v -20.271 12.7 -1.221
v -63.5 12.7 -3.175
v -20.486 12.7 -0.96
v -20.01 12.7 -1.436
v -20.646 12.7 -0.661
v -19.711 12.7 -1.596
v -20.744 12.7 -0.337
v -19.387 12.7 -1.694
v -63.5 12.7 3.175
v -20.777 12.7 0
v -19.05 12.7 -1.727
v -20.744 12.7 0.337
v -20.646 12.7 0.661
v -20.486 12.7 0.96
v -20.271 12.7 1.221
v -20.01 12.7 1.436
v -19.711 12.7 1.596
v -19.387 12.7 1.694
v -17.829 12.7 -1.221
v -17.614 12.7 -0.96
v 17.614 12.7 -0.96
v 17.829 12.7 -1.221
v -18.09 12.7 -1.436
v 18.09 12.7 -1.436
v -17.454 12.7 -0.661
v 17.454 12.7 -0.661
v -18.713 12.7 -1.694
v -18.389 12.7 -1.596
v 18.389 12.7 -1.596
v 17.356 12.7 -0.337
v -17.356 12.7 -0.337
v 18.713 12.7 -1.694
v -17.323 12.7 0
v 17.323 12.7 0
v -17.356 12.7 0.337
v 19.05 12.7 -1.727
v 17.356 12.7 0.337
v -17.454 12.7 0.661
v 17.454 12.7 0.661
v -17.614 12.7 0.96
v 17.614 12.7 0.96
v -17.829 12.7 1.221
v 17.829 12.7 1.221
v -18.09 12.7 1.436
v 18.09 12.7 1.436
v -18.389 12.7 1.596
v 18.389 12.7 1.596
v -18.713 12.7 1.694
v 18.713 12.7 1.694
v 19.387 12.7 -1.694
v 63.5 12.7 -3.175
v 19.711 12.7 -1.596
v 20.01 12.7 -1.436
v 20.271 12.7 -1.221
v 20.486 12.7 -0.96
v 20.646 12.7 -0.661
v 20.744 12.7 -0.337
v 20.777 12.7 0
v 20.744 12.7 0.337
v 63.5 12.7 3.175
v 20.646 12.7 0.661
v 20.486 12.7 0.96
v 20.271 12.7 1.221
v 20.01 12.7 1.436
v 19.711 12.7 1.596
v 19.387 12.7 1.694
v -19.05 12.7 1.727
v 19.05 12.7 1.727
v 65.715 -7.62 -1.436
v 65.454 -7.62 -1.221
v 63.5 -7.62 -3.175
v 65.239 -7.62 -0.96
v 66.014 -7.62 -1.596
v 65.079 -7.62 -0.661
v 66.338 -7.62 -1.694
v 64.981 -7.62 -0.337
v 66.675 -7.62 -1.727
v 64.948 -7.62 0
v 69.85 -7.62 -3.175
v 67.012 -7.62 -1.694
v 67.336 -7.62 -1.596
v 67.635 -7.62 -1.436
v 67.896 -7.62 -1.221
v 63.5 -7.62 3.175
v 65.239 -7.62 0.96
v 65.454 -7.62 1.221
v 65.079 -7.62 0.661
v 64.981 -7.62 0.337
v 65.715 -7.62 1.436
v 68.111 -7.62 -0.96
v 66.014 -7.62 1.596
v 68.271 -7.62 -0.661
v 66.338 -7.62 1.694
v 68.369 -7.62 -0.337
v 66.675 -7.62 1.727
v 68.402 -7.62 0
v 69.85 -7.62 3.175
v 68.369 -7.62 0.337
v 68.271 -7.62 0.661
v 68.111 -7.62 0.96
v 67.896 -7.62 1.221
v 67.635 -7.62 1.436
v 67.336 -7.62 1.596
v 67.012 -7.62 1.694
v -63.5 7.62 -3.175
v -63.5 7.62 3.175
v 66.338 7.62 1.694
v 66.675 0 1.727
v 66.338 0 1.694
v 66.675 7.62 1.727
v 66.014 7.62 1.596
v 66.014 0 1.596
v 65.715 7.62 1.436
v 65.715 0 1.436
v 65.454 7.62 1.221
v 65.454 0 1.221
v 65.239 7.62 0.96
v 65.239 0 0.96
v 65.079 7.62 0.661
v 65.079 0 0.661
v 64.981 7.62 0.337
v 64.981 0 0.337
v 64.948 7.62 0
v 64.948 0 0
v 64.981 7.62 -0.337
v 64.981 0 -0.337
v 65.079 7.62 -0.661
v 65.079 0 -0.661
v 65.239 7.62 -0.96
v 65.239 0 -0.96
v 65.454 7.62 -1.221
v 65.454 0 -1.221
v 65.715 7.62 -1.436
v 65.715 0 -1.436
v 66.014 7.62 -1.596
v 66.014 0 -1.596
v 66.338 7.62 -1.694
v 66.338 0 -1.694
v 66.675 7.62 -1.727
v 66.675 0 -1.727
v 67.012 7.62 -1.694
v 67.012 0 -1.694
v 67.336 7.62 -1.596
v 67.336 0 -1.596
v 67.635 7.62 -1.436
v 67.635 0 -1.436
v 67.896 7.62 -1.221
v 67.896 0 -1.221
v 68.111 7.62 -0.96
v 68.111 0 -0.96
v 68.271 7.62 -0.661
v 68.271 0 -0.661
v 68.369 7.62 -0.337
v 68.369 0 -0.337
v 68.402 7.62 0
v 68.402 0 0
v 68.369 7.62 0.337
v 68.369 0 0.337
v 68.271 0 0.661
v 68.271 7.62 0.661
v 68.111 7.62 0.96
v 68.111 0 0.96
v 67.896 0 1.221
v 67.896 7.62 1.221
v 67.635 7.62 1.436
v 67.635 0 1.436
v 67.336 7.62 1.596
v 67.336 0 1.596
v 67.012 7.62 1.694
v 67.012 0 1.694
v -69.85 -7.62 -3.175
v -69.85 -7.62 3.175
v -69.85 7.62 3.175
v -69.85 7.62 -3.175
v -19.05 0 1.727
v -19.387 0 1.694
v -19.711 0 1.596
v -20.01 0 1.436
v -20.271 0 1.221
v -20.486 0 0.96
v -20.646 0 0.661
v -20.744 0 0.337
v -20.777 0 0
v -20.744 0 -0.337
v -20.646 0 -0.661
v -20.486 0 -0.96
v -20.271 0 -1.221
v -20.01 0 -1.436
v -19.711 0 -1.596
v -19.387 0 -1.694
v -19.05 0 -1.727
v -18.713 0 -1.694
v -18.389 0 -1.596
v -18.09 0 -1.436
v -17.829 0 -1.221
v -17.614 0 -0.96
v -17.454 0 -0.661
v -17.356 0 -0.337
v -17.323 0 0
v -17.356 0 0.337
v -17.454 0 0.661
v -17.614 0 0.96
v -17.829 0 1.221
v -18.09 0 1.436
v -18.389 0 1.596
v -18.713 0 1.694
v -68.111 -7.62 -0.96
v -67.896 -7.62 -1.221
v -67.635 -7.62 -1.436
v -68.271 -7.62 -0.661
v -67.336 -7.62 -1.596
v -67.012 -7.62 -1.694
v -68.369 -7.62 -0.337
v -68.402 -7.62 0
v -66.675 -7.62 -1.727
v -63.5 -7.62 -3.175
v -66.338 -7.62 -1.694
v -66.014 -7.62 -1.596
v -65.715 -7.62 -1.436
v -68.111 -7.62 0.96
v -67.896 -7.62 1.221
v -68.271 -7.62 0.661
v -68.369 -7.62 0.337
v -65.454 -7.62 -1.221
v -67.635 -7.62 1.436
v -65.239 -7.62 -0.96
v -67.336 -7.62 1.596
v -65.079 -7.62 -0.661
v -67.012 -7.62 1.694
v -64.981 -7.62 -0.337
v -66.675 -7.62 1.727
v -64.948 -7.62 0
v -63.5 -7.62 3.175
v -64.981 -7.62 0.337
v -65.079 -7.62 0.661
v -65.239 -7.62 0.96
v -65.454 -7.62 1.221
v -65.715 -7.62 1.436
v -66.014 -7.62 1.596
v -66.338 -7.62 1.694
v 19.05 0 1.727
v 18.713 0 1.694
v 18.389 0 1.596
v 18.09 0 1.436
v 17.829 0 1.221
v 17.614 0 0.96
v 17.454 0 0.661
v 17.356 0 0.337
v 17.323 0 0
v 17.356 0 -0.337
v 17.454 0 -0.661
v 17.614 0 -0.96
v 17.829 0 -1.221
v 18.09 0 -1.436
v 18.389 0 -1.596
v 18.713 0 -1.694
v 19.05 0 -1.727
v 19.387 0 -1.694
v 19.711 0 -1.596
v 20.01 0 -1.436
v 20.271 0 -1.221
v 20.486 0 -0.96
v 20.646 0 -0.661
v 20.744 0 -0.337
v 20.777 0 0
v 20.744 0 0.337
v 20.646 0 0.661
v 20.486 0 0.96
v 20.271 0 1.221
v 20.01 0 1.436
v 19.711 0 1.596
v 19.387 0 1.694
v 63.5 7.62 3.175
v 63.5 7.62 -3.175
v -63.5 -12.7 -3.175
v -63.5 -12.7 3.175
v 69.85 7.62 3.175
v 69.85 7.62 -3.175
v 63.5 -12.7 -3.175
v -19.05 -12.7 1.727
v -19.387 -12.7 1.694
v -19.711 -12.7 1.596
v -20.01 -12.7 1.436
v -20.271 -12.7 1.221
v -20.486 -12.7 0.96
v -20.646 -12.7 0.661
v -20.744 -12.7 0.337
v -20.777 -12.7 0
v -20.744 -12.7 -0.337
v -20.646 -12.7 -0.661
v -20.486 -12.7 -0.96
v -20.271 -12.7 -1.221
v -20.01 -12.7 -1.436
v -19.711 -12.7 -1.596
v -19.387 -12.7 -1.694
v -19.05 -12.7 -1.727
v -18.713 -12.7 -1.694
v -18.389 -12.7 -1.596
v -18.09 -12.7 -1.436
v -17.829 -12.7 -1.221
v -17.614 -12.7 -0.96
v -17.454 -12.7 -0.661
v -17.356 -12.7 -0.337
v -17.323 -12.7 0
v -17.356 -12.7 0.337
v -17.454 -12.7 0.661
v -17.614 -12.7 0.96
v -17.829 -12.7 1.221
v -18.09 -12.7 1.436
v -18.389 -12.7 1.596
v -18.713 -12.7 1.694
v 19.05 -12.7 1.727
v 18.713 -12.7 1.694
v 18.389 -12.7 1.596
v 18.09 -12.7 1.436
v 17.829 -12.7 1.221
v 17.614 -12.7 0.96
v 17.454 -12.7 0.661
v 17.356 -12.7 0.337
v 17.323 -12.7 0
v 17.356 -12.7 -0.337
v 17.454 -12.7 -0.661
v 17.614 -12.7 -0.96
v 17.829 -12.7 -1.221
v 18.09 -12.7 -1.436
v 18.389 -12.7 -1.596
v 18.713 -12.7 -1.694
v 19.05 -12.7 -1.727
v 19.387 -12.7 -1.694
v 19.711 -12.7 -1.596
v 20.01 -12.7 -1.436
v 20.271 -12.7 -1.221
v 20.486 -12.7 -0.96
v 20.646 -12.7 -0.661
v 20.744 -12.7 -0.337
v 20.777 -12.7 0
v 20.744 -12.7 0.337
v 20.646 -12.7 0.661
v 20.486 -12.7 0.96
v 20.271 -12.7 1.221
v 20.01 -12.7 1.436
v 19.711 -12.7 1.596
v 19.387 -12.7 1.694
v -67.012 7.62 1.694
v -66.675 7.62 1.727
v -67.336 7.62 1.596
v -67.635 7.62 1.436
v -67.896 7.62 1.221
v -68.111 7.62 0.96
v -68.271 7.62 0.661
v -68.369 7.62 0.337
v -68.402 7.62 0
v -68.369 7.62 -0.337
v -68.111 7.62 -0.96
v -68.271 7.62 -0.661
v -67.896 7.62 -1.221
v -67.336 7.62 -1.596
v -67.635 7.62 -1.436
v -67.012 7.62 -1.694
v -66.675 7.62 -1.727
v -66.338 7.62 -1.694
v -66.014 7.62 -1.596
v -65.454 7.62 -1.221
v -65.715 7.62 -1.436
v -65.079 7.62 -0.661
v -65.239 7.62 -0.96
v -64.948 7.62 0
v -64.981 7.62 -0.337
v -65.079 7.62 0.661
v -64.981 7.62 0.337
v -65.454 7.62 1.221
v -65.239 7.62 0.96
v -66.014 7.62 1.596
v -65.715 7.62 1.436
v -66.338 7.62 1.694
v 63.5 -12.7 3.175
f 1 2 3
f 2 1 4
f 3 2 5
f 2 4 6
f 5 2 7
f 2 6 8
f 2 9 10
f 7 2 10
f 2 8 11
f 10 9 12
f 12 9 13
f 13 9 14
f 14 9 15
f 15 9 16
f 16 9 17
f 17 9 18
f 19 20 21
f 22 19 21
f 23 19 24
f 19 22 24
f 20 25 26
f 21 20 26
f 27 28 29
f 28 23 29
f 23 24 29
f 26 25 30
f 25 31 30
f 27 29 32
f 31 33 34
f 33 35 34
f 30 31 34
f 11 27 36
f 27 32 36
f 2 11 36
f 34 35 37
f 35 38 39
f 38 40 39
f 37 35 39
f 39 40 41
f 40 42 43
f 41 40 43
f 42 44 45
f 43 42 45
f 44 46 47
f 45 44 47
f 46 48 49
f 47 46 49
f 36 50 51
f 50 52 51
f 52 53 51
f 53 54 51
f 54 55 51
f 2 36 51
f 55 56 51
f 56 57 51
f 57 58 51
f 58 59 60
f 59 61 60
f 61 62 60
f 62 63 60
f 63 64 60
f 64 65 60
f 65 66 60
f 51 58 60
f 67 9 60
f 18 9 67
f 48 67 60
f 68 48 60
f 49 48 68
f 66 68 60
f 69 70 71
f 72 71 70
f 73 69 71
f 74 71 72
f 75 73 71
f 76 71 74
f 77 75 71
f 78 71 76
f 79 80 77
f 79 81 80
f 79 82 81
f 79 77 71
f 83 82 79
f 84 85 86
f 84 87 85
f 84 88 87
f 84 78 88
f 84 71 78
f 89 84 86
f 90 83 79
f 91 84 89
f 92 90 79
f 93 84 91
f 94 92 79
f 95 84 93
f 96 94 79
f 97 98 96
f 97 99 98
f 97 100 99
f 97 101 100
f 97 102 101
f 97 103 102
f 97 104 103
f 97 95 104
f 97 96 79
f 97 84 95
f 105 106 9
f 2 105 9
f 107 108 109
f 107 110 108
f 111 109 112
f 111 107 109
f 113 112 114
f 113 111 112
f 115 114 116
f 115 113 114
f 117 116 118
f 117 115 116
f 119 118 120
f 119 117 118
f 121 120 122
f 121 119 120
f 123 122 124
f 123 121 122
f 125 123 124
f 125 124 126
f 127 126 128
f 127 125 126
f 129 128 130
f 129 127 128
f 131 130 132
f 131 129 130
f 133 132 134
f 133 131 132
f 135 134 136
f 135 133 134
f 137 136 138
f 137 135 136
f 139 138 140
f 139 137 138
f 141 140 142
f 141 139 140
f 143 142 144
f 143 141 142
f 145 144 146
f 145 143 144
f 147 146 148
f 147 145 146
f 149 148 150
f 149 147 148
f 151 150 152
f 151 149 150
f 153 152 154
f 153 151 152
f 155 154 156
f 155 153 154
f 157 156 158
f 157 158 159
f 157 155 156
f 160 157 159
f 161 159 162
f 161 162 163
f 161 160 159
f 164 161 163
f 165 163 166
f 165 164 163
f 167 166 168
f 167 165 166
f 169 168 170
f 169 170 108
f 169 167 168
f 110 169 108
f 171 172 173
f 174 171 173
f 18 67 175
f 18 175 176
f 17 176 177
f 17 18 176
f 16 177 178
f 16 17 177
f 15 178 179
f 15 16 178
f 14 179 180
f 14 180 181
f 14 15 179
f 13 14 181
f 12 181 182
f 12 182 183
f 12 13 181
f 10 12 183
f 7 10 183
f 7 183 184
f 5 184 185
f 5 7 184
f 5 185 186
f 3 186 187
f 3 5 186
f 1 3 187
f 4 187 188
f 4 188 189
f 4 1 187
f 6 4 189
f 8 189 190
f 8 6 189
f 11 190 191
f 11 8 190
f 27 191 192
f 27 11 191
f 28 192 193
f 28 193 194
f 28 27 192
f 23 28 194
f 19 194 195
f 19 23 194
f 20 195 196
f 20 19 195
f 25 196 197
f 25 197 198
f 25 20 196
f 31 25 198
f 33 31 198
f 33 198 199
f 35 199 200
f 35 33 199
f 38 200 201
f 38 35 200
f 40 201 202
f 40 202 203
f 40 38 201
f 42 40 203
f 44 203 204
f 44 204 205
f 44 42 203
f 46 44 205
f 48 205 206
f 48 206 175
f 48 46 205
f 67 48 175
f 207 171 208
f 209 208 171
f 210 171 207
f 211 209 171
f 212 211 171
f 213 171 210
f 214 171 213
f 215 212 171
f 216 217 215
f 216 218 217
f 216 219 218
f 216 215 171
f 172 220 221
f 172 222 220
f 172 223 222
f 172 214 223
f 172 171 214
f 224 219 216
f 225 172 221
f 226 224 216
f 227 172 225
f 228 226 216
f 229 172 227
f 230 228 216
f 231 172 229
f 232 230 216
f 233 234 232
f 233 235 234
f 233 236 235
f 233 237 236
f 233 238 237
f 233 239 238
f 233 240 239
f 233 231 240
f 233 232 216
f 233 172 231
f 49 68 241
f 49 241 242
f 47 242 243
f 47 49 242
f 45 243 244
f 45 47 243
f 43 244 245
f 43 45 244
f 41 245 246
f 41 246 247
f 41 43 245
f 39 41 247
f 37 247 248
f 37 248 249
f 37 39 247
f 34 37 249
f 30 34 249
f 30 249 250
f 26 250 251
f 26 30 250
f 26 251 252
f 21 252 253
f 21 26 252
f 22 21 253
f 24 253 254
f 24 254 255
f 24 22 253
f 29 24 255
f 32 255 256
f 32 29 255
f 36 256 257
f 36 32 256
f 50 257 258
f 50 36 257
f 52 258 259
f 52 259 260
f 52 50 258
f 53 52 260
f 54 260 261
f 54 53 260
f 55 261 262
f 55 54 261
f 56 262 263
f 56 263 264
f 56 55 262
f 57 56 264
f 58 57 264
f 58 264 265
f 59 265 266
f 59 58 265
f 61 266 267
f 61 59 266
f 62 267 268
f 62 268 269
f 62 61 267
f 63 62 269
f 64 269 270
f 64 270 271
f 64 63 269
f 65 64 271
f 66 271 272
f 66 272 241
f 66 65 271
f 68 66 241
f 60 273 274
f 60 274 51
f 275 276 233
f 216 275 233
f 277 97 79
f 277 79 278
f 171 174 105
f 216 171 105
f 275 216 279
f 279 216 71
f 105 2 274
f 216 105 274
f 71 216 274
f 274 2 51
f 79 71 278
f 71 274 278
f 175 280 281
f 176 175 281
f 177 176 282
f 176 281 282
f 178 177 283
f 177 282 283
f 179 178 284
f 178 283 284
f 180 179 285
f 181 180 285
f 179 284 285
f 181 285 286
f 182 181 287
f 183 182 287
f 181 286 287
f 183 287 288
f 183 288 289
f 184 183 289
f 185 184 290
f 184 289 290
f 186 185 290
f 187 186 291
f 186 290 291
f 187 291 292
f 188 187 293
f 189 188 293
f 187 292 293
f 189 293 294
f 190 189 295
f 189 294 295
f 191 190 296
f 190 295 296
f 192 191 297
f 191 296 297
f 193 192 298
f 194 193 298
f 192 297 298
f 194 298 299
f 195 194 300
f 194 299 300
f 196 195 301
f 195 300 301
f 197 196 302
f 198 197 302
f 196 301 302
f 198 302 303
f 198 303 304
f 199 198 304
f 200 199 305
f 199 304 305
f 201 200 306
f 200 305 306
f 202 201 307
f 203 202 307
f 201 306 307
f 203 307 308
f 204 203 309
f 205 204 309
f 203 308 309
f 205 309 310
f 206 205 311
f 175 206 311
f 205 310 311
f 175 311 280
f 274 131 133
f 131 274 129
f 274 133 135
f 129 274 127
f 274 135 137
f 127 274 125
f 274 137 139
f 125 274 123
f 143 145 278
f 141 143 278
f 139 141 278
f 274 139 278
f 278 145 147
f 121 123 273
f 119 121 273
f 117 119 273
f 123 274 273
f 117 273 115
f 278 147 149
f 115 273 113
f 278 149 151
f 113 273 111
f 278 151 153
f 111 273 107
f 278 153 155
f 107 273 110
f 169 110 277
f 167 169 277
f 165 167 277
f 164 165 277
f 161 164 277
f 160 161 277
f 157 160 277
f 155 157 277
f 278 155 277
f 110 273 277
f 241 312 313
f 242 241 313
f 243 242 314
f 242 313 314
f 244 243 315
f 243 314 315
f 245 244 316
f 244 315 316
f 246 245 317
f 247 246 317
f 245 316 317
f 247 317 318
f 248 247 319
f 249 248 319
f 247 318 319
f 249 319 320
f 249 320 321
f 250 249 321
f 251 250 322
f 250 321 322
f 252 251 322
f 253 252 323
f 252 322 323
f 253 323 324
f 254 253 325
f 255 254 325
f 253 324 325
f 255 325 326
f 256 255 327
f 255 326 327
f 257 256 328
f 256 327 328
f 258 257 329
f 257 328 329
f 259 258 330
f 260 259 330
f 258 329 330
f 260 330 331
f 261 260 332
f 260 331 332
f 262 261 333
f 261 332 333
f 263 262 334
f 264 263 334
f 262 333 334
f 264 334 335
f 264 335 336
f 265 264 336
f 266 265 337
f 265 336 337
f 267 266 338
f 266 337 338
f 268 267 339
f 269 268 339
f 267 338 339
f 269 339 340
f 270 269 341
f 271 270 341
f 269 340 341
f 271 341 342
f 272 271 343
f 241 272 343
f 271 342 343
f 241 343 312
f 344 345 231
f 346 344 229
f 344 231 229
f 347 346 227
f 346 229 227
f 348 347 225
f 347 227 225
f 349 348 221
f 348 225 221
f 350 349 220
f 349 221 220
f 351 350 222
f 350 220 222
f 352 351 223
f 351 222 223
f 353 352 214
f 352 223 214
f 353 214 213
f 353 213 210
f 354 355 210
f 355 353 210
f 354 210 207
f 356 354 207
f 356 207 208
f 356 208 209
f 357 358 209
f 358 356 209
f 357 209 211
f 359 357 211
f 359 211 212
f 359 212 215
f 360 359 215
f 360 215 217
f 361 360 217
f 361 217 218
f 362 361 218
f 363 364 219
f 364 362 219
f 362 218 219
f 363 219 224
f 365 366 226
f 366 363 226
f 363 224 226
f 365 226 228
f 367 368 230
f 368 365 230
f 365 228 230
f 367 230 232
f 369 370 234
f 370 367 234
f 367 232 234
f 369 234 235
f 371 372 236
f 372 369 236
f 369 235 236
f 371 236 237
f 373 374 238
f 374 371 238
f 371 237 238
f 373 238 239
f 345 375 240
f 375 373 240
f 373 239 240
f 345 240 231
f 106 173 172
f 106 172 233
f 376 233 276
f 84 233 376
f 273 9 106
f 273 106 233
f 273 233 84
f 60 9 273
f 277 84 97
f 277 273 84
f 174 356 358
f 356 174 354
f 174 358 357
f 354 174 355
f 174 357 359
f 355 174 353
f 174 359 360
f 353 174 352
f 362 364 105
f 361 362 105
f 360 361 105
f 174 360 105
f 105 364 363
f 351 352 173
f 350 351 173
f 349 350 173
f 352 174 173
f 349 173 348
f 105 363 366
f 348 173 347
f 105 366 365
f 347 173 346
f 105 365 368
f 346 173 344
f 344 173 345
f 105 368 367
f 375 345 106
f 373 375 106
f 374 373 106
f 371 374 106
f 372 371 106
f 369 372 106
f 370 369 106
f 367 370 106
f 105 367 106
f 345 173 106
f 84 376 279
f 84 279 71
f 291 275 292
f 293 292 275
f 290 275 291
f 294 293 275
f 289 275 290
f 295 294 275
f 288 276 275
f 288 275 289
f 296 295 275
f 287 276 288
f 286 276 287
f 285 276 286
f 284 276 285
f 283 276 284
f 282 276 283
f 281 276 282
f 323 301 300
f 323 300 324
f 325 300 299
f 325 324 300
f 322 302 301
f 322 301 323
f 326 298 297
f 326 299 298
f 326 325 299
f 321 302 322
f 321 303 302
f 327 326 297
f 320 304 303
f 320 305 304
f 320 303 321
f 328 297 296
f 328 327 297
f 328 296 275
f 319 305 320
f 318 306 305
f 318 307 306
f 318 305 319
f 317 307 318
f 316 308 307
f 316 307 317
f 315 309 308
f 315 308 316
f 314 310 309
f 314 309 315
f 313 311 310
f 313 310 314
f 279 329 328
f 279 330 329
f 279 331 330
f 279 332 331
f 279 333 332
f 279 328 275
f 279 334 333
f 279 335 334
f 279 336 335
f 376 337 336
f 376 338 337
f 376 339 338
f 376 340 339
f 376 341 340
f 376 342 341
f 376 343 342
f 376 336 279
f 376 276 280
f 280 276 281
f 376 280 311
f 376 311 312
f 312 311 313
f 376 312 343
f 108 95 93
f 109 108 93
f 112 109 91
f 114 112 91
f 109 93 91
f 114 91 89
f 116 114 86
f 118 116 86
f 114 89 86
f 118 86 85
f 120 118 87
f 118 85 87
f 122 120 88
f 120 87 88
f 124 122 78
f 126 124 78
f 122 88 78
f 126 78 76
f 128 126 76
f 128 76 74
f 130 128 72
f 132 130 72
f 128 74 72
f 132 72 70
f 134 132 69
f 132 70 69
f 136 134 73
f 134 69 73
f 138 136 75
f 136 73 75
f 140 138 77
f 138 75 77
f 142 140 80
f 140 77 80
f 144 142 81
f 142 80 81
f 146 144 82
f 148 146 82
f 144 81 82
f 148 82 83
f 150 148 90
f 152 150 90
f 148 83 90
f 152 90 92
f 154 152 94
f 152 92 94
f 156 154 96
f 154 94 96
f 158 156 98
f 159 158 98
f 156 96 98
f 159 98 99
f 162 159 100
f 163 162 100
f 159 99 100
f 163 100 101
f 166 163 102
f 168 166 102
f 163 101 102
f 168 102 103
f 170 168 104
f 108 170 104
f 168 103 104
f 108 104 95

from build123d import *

# Parameters (mm, degrees)
SKETCH1_W                          = 139.7
SKETCH1_H                          = 25.4
BOSS_EXTRUDE1_DEPTH                = 3.175
CUT_EXTRUDE1_REACH                 = 73.279
SKETCH2_W                          = 6.35
SKETCH2_H                          = 5.08
TAP_DRILL_FOR_8_32_TAP1_AT_2_COUNT = 2
TAP_DRILL_FOR_8_32_TAP1_AT_2_PITCH = 47.625
TAP_DRILL_FOR_8_32_TAP1_AT_3_COUNT = 2
TAP_DRILL_FOR_8_32_TAP1_AT_3_PITCH = 85.725
TAP_DRILL_FOR_8_32_TAP1_AT_4_COUNT = 2
TAP_DRILL_FOR_8_32_TAP1_AT_4_PITCH = 133.35


with BuildPart() as part:
    # Sketch1 → Boss-Extrude1 (new, symmetric)
    with BuildSketch(Plane.XY):
        Rectangle(SKETCH1_W, SKETCH1_H)
    extrude(amount=BOSS_EXTRUDE1_DEPTH, both=True)

    # Sketch2 → Cut-Extrude1 (cut, up to next)
    with BuildSketch(Plane.XY.offset(3.175), mode=Mode.PRIVATE) as cut_extrude1_sk1:
        with Locations((-66.675, 10.16)):
            Rectangle(SKETCH2_W, SKETCH2_H)
    cut_extrude1_tool1 = extrude(cut_extrude1_sk1.sketch, amount=-CUT_EXTRUDE1_REACH, mode=Mode.PRIVATE) & part.part
    # Sketch2 → Cut-Extrude1 (cut, up to next)
    with BuildSketch(Plane.XY.offset(3.175), mode=Mode.PRIVATE) as cut_extrude1_sk2:
        with Locations((-66.675, -10.16)):
            Rectangle(SKETCH2_W, SKETCH2_H)
    cut_extrude1_tool2 = extrude(cut_extrude1_sk2.sketch, amount=-CUT_EXTRUDE1_REACH, mode=Mode.PRIVATE) & part.part
    # Sketch2 → Cut-Extrude1 (cut, up to next)
    with BuildSketch(Plane.XY.offset(3.175), mode=Mode.PRIVATE) as cut_extrude1_sk3:
        with Locations((66.675, 10.16)):
            Rectangle(SKETCH2_W, SKETCH2_H)
    cut_extrude1_tool3 = extrude(cut_extrude1_sk3.sketch, amount=-CUT_EXTRUDE1_REACH, mode=Mode.PRIVATE) & part.part
    # Sketch2 → Cut-Extrude1 (cut, up to next)
    with BuildSketch(Plane.XY.offset(3.175), mode=Mode.PRIVATE) as cut_extrude1_sk4:
        with Locations((66.675, -10.16)):
            Rectangle(SKETCH2_W, SKETCH2_H)
    cut_extrude1_tool4 = extrude(cut_extrude1_sk4.sketch, amount=-CUT_EXTRUDE1_REACH, mode=Mode.PRIVATE) & part.part
    add(cut_extrude1_tool1.solids().sort_by_distance((-66.675, 10.16, 3.175))[0], mode=Mode.SUBTRACT)
    add(cut_extrude1_tool2.solids().sort_by_distance((-66.675, -10.16, 3.175))[0], mode=Mode.SUBTRACT)
    add(cut_extrude1_tool3.solids().sort_by_distance((66.675, 10.16, 3.175))[0], mode=Mode.SUBTRACT)
    add(cut_extrude1_tool4.solids().sort_by_distance((66.675, -10.16, 3.175))[0], mode=Mode.SUBTRACT)

    # Sketch5 → Tap Drill for #8-32 Tap1 (revolve, cut)
    with BuildSketch(Plane(origin=(-66.675, 12.7, 0), x_dir=(0, 0, 1), z_dir=(1, 0, 0))):
        Polygon((0, 0), (0, 13.737806461), (1.7272, 12.7), (1.7272, 0), align=None)
    tap_drill_for_8_32_tap1 = revolve(axis=Axis((-66.675, 19.05, 0), (0, -1, 0)), mode=Mode.SUBTRACT)

    # Tap Drill for #8-32 Tap1 at 2: Tap Drill for #8-32 Tap1 ×2
    with Locations(*[(i * TAP_DRILL_FOR_8_32_TAP1_AT_2_PITCH, 0, 0) for i in range(1, TAP_DRILL_FOR_8_32_TAP1_AT_2_COUNT)]):
        add(tap_drill_for_8_32_tap1, mode=Mode.SUBTRACT)

    # Tap Drill for #8-32 Tap1 at 3: Tap Drill for #8-32 Tap1 ×2
    with Locations(*[(i * TAP_DRILL_FOR_8_32_TAP1_AT_3_PITCH, 0, 0) for i in range(1, TAP_DRILL_FOR_8_32_TAP1_AT_3_COUNT)]):
        add(tap_drill_for_8_32_tap1, mode=Mode.SUBTRACT)

    # Tap Drill for #8-32 Tap1 at 4: Tap Drill for #8-32 Tap1 ×2
    with Locations(*[(i * TAP_DRILL_FOR_8_32_TAP1_AT_4_PITCH, 0, 0) for i in range(1, TAP_DRILL_FOR_8_32_TAP1_AT_4_COUNT)]):
        add(tap_drill_for_8_32_tap1, mode=Mode.SUBTRACT)

    # Mirror1: Tap Drill for #8-32 Tap1 across plane
    add(tap_drill_for_8_32_tap1.mirror(Plane.ZX), mode=Mode.SUBTRACT)

    # Mirror1 copy 1 sketch → Mirror1 copy 1 (revolve, cut)
    with BuildSketch(Plane(origin=(-19.05, -12.7, 0), x_dir=(0, 0, 1), z_dir=(1, 0, 0))):
        Polygon((0, 0), (0, -13.737806461), (1.7272, -12.7), (1.7272, 0), align=None)
    revolve(axis=Axis((-19.05, -19.05, 0), (0, -1, 0)), mode=Mode.SUBTRACT)

    # Mirror1 copy 2 sketch → Mirror1 copy 2 (revolve, cut)
    with BuildSketch(Plane(origin=(19.05, -12.7, 0), x_dir=(0, 0, 1), z_dir=(1, 0, 0))):
        Polygon((0, 0), (0, -13.737806461), (1.7272, -12.7), (1.7272, 0), align=None)
    revolve(axis=Axis((19.05, -19.05, 0), (0, -1, 0)), mode=Mode.SUBTRACT)

    # Mirror1 copy 3 sketch → Mirror1 copy 3 (revolve, cut)
    with BuildSketch(Plane(origin=(66.675, -12.7, 0), x_dir=(0, 0, 1), z_dir=(1, 0, 0))):
        Polygon((0, 0), (0, -13.737806461), (1.7272, -12.7), (1.7272, 0), align=None)
    revolve(axis=Axis((66.675, -19.05, 0), (0, -1, 0)), mode=Mode.SUBTRACT)


solid = part.part
